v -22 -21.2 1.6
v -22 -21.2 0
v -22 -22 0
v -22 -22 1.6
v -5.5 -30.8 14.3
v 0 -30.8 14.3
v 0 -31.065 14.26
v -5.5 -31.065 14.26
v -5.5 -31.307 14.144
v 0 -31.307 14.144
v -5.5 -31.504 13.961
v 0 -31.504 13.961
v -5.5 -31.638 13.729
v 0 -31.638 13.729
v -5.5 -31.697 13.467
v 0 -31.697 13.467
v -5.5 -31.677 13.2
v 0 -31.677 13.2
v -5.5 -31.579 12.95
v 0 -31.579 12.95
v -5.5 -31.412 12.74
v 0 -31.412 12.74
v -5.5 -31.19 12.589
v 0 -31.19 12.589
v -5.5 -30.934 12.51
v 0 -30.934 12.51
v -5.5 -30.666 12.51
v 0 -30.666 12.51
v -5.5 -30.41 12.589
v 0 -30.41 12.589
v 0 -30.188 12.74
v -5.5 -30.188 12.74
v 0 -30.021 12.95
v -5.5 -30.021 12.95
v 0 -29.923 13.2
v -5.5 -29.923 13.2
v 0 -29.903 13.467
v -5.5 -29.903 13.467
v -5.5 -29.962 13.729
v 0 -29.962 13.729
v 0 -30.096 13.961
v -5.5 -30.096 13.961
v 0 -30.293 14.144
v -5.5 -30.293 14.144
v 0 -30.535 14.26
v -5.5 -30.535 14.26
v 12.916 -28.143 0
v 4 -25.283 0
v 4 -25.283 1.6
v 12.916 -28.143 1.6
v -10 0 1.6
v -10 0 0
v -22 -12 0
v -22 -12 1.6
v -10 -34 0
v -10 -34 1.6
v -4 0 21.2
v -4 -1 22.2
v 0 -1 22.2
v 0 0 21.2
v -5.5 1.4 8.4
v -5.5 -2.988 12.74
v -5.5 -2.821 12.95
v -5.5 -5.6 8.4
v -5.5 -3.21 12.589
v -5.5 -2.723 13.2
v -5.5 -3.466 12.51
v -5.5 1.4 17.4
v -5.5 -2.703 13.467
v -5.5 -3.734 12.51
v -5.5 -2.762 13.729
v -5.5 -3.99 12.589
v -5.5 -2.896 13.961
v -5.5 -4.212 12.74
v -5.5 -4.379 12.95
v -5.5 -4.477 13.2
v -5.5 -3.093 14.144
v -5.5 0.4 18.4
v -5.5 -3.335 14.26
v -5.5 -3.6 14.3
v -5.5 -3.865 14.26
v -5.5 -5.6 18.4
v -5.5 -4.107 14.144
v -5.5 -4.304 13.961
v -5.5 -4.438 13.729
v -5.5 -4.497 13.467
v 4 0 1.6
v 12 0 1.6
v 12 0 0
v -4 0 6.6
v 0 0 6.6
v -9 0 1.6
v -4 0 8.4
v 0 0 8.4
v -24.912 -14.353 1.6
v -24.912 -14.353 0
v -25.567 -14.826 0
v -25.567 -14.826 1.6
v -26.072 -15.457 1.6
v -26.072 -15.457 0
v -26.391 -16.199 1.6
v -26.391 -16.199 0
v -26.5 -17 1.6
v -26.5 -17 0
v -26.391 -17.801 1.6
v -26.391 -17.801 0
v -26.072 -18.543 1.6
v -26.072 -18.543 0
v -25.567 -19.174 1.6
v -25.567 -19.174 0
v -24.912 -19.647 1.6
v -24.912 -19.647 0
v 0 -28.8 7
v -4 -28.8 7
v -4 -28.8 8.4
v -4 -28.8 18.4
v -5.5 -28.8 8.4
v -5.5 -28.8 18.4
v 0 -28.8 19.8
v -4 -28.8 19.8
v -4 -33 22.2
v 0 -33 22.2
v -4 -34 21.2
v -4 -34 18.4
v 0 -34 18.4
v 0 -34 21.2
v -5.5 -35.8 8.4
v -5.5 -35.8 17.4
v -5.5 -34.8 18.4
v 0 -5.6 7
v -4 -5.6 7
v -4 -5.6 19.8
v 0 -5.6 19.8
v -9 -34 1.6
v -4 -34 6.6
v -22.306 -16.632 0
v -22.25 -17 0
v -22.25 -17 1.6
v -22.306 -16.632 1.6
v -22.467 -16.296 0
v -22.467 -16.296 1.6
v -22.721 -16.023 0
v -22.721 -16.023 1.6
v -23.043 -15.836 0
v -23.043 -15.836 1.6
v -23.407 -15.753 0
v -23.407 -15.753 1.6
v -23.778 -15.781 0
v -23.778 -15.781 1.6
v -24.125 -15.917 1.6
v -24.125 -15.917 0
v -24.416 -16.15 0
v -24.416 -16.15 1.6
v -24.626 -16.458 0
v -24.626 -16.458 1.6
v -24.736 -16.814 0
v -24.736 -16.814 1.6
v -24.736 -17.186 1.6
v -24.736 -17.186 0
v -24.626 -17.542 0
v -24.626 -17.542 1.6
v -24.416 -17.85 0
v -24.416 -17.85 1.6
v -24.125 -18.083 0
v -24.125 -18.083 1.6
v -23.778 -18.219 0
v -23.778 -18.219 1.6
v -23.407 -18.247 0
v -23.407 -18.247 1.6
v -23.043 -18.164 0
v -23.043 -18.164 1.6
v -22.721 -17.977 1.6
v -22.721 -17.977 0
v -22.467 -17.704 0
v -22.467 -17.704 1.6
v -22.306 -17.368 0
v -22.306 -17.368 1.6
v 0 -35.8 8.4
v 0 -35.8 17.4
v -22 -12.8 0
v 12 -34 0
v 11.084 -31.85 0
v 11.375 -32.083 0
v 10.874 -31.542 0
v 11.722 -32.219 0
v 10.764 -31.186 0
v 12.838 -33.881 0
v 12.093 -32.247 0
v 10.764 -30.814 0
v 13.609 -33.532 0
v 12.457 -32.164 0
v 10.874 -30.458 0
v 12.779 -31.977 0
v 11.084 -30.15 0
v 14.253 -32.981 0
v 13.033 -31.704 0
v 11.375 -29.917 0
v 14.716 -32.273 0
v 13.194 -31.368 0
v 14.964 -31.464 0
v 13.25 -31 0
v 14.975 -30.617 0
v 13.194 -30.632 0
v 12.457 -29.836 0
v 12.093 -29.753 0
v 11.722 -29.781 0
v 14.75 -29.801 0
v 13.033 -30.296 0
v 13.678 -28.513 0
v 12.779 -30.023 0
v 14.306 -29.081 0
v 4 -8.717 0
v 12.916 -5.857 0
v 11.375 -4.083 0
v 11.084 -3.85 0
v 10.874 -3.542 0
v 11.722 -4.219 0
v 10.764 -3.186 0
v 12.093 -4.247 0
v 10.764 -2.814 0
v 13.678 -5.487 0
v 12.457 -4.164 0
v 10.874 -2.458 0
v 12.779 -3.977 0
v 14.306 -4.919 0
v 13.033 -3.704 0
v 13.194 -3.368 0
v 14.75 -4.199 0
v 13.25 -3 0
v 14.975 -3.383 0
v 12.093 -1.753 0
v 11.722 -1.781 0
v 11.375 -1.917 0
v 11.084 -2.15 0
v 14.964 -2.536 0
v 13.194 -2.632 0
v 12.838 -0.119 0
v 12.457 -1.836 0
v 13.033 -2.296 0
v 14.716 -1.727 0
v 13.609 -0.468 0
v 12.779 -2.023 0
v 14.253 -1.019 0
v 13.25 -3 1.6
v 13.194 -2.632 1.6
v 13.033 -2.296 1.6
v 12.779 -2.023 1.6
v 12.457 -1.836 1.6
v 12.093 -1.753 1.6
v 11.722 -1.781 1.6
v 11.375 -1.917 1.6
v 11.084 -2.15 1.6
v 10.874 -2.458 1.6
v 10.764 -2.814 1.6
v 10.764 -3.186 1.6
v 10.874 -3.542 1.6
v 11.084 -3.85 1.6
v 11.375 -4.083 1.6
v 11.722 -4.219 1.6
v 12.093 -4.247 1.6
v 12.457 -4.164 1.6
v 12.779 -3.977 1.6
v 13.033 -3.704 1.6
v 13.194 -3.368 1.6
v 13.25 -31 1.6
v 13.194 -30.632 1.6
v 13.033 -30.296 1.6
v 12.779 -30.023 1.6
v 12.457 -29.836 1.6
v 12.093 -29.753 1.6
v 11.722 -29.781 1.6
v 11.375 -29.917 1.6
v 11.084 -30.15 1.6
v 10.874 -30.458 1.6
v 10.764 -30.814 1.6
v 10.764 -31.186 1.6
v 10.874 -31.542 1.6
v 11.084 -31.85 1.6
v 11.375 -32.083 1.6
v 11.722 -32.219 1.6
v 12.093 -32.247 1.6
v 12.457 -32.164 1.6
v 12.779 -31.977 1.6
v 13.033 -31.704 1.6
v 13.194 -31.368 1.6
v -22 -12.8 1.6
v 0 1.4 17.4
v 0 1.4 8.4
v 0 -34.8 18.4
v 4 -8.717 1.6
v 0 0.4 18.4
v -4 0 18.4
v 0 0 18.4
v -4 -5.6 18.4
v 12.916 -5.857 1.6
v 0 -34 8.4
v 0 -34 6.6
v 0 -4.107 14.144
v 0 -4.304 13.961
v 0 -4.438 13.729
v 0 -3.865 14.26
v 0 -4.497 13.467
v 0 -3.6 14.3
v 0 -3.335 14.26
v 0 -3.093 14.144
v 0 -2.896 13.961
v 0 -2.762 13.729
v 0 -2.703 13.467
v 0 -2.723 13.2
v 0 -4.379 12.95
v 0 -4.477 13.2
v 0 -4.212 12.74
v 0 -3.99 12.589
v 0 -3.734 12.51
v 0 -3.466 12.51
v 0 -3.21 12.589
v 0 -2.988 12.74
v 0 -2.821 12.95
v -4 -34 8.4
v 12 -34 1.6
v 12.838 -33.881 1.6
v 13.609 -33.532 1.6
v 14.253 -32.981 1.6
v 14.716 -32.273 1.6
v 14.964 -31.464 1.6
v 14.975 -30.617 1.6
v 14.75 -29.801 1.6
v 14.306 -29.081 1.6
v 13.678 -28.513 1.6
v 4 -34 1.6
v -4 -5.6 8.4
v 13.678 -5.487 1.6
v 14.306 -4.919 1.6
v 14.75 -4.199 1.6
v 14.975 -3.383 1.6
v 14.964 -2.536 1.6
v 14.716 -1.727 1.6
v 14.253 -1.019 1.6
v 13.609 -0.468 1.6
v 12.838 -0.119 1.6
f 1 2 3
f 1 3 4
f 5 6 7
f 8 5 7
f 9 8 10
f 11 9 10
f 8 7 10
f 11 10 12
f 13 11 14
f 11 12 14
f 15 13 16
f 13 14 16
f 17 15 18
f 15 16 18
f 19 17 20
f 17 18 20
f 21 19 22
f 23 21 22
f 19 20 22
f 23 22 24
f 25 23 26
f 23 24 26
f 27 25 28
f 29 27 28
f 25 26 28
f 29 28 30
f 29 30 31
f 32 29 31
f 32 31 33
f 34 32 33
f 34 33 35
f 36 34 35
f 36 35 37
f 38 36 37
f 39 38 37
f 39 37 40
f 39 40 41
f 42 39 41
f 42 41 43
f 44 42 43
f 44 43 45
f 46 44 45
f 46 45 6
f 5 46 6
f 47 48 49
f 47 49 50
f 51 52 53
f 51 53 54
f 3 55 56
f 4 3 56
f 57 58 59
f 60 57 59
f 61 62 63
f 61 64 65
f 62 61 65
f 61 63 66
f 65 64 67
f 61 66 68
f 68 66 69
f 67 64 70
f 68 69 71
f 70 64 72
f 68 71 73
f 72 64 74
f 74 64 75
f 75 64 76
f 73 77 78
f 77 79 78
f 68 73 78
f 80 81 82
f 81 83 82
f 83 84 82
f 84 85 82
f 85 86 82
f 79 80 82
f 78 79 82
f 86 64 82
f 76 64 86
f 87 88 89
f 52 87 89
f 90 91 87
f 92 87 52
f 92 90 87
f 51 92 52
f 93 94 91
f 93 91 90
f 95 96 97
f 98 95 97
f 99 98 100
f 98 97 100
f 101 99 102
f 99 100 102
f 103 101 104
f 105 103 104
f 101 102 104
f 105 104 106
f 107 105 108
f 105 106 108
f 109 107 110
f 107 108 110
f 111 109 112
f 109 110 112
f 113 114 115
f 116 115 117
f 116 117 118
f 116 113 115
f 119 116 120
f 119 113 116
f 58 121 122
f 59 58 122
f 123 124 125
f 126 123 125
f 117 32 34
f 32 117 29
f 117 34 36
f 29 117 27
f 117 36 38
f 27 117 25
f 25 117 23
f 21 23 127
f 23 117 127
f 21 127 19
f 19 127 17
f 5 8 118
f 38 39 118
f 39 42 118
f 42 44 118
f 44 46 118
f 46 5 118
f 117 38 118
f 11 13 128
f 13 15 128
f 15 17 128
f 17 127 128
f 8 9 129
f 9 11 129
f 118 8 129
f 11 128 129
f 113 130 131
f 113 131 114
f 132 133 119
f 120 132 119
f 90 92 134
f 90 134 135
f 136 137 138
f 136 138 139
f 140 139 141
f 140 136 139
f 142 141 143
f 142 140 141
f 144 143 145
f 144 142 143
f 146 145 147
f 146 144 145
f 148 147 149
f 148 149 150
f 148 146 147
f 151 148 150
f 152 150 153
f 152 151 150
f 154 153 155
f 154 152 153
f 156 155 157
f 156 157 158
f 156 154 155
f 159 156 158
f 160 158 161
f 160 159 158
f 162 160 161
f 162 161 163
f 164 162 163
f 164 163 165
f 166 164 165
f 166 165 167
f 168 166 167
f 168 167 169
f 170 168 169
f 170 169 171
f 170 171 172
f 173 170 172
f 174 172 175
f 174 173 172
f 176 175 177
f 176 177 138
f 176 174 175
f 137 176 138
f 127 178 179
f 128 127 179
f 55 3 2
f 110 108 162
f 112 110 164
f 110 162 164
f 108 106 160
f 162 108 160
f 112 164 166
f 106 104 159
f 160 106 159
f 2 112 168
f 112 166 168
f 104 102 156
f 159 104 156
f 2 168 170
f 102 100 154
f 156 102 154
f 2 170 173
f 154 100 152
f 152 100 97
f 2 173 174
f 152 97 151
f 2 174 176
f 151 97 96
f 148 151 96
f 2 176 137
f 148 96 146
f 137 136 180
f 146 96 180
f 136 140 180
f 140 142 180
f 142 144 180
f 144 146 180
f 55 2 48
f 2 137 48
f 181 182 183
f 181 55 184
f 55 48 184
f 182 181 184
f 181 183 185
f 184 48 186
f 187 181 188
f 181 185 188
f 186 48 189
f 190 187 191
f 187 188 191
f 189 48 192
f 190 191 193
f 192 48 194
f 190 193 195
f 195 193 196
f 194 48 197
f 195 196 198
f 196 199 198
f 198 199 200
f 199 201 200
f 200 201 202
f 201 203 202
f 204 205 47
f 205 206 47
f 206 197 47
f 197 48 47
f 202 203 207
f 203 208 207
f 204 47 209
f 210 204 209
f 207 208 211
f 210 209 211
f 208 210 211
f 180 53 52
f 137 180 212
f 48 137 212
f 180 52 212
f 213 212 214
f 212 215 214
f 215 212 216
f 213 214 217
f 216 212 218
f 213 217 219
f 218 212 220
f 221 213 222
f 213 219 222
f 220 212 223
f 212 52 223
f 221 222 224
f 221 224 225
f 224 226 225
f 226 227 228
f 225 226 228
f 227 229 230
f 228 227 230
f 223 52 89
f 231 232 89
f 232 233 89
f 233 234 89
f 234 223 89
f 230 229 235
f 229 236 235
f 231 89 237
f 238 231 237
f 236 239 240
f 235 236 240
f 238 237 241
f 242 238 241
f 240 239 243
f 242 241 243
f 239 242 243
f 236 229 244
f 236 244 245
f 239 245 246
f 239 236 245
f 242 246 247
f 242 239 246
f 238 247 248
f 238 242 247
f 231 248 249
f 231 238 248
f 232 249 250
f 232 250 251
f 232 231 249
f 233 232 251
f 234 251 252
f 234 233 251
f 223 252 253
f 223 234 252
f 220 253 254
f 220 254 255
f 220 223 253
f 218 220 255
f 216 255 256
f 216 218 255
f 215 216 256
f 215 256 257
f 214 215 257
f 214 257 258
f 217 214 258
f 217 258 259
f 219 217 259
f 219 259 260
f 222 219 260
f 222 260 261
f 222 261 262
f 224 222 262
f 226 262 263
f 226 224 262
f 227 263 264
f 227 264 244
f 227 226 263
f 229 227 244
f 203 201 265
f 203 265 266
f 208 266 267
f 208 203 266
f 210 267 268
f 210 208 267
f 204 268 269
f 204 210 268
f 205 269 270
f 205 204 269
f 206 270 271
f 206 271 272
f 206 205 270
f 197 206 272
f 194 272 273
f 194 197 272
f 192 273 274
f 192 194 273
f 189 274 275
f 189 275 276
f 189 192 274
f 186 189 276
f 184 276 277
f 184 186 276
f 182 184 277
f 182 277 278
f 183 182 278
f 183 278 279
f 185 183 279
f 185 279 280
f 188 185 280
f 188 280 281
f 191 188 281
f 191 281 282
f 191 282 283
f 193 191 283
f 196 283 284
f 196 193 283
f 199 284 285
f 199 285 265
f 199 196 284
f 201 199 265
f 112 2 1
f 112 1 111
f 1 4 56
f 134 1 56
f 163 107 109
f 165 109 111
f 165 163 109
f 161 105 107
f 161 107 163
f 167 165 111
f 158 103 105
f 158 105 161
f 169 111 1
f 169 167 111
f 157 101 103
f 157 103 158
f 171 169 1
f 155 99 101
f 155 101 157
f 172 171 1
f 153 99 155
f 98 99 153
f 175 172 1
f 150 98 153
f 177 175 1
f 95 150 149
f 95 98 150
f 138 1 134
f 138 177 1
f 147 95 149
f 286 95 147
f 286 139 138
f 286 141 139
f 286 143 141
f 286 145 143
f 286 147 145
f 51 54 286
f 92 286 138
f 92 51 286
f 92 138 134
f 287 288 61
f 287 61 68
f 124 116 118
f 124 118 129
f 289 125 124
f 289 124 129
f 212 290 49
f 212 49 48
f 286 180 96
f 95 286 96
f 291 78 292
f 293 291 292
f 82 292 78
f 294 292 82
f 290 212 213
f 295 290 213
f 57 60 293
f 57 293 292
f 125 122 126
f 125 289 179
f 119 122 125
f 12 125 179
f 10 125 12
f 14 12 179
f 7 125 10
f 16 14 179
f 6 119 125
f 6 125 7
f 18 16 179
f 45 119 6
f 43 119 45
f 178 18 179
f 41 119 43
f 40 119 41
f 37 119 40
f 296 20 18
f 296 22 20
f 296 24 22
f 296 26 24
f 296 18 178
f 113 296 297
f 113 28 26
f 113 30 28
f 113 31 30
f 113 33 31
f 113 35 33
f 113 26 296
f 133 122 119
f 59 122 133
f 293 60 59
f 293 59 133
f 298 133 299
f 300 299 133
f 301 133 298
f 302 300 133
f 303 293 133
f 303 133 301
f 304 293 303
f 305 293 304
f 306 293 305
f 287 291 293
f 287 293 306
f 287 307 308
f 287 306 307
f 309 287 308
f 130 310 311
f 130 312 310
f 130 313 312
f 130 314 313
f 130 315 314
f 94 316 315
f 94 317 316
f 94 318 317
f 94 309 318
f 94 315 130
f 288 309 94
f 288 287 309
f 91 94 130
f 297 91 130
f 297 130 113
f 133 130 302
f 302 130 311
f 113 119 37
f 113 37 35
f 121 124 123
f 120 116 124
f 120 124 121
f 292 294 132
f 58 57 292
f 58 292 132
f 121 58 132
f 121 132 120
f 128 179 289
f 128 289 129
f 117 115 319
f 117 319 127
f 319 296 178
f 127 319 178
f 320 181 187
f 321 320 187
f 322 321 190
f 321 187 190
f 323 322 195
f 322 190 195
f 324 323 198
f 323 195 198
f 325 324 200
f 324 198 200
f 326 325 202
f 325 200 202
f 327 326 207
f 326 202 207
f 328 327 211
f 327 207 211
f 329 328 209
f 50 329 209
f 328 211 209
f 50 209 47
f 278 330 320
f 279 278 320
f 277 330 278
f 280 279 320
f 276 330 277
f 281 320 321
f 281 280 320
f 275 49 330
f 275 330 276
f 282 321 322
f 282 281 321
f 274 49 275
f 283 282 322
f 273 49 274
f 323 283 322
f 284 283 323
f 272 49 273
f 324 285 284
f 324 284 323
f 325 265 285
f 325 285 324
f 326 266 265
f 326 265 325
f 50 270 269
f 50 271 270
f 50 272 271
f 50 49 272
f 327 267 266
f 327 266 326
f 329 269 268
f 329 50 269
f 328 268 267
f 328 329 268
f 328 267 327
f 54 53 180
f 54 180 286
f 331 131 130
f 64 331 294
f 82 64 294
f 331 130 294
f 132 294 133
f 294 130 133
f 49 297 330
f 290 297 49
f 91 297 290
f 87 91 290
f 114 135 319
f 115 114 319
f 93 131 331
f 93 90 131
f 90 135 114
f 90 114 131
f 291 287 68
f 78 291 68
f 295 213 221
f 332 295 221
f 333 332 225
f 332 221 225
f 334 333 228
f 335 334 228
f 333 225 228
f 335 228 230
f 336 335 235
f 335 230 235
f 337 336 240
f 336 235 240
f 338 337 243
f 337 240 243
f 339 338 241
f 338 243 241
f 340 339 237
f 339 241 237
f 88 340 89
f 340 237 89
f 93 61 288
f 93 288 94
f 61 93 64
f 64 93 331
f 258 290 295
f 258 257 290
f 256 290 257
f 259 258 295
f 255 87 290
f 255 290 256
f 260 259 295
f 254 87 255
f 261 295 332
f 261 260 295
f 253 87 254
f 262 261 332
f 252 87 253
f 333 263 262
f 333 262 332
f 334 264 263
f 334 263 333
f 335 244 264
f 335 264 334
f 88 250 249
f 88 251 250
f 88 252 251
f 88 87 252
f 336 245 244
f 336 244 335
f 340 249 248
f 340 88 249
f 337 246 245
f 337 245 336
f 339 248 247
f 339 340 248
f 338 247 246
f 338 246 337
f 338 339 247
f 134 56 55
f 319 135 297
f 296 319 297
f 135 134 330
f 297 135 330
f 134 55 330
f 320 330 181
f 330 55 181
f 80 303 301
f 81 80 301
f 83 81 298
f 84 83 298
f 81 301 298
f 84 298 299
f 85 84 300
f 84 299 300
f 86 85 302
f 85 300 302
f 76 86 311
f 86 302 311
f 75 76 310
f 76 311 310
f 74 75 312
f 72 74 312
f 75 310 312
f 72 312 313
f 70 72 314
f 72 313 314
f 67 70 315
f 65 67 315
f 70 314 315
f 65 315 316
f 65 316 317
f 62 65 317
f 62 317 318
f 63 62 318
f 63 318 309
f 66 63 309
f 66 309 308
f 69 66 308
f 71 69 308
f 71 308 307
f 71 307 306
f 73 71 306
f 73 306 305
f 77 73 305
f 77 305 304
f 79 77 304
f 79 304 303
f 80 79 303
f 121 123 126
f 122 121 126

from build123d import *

# Parameters (mm, degrees)
PAD_DEPTH       = 34
SKETCH_R        = 0.9
POCKET_DEPTH    = 22.001
SKETCH003_W     = 12.8
SKETCH003_H     = 23.2
POCKET001_DEPTH = 22.001
SKETCH005_R     = 1.25
PAD001_DEPTH    = 1.6
SKETCH006_R     = 1.25
PAD002_DEPTH    = 1.6
SKETCH007_W     = 10
SKETCH007_H     = 7
SKETCH007_R     = 0.9
PAD003_DEPTH    = 5.5
CHAMFER_SIZE    = 12
CHAMFER001_SIZE = 1
CHAMFER002_SIZE = 1


with BuildPart() as part:
    # Sketch001 → Pad (new body)
    with BuildSketch(Plane.XZ):
        Polygon((-22, 1.6), (-9, 1.6), (-4, 6.6), (-4, 22.2), (0, 22.2), (0, 6.6), (4, 1.6), (4, 0), (-3.601763, 0), (-22, 0), align=None)
    extrude(amount=PAD_DEPTH)

    # Sketch → Pocket (cut, through all)
    with BuildSketch(Plane(origin=(0, 0, 0), x_dir=(0, 0, 1), z_dir=(1, 0, 0))):
        with Locations((13.4, 30.8)):
            Circle(SKETCH_R)
        with Locations((13.4, 3.6)):
            Circle(SKETCH_R)
    extrude(amount=-POCKET_DEPTH, mode=Mode.SUBTRACT)

    # Sketch003 (on DatumPlane) → Pocket001 (cut, through all)
    with BuildSketch(Plane(origin=(0, 0, 0), x_dir=(0, 0, 1), z_dir=(1, 0, 0))):
        with Locations((13.4, 17.2)):
            Rectangle(SKETCH003_W, SKETCH003_H)
    extrude(amount=-POCKET001_DEPTH, mode=Mode.SUBTRACT)

    # Sketch005 → Pad001 (join)
    with BuildSketch(Plane.XY):
        with BuildLine():
            ThreePointArc((-24.911765, -14.352941), (-26.5, -17), (-24.911765, -19.647059))
            Line((-20.5, -22), (-24.911765, -19.647059))
            Line((-20.5, -12), (-20.5, -22))
            Line((-20.5, -12), (-24.911765, -14.352941))
        make_face()
        with Locations((-23.5, -17)):
            Circle(SKETCH005_R, mode=Mode.SUBTRACT)
    extrude(amount=PAD001_DEPTH)

    # Sketch006 → Pad002 (join)
    with BuildSketch(Plane.XY):
        with BuildLine():
            ThreePointArc((12, -34), (14.963938, -31.463756), (12.916362, -28.143379))
            Line((0, -24), (12.916362, -28.143379))
            Line((0, -34), (0, -24))
            Line((0, -34), (12, -34))
        make_face()
        with Locations((12, -31)):
            Circle(SKETCH006_R, mode=Mode.SUBTRACT)
        with BuildLine():
            ThreePointArc((12.916362, -5.856621), (14.96394, -2.536256), (12.000023, 0))
            Line((0, 0), (12.000023, 0))
            Line((0, 0), (0, -10))
            Line((0, -10), (12.916362, -5.856621))
        make_face()
        with Locations((12, -3)):
            Circle(SKETCH006_R, mode=Mode.SUBTRACT)
    extrude(amount=PAD002_DEPTH)

    # Sketch007 (on Face3 of Pad002) → Pad003 (join)
    with BuildSketch(Plane(origin=(0, 0, 0), x_dir=(0, 0, 1), z_dir=(1, 0, 0))):
        with Locations((13.4, 32.3)):
            Rectangle(SKETCH007_W, SKETCH007_H)
        with Locations((13.4, 30.8)):
            Circle(SKETCH007_R, mode=Mode.SUBTRACT)
        with Locations((13.4, 2.1)):
            Rectangle(SKETCH007_W, SKETCH007_H)
        with Locations((13.4, 3.6)):
            Circle(SKETCH007_R, mode=Mode.SUBTRACT)
    extrude(amount=-PAD003_DEPTH)

    # Chamfer
    chamfer_edges = [part.edges().sort_by_distance(p)[0] for p in [
        (-22, 0, 0.8),
        (-22, -34, 0.8),
    ]]
    chamfer(chamfer_edges, length=CHAMFER_SIZE)

    # Chamfer001
    chamfer001_edges = [part.edges().sort_by_distance(p)[0] for p in [
        (-2, 0, 22.2),
        (-2, -34, 22.2),
    ]]
    chamfer(chamfer001_edges, length=CHAMFER001_SIZE)

    # Chamfer002
    chamfer002_edges = [part.edges().sort_by_distance(p)[0] for p in [
        (-2.75, 1.4, 18.4),
        (-2.75, -35.8, 18.4),
    ]]
    chamfer(chamfer002_edges, length=CHAMFER002_SIZE)


solid = part.part
